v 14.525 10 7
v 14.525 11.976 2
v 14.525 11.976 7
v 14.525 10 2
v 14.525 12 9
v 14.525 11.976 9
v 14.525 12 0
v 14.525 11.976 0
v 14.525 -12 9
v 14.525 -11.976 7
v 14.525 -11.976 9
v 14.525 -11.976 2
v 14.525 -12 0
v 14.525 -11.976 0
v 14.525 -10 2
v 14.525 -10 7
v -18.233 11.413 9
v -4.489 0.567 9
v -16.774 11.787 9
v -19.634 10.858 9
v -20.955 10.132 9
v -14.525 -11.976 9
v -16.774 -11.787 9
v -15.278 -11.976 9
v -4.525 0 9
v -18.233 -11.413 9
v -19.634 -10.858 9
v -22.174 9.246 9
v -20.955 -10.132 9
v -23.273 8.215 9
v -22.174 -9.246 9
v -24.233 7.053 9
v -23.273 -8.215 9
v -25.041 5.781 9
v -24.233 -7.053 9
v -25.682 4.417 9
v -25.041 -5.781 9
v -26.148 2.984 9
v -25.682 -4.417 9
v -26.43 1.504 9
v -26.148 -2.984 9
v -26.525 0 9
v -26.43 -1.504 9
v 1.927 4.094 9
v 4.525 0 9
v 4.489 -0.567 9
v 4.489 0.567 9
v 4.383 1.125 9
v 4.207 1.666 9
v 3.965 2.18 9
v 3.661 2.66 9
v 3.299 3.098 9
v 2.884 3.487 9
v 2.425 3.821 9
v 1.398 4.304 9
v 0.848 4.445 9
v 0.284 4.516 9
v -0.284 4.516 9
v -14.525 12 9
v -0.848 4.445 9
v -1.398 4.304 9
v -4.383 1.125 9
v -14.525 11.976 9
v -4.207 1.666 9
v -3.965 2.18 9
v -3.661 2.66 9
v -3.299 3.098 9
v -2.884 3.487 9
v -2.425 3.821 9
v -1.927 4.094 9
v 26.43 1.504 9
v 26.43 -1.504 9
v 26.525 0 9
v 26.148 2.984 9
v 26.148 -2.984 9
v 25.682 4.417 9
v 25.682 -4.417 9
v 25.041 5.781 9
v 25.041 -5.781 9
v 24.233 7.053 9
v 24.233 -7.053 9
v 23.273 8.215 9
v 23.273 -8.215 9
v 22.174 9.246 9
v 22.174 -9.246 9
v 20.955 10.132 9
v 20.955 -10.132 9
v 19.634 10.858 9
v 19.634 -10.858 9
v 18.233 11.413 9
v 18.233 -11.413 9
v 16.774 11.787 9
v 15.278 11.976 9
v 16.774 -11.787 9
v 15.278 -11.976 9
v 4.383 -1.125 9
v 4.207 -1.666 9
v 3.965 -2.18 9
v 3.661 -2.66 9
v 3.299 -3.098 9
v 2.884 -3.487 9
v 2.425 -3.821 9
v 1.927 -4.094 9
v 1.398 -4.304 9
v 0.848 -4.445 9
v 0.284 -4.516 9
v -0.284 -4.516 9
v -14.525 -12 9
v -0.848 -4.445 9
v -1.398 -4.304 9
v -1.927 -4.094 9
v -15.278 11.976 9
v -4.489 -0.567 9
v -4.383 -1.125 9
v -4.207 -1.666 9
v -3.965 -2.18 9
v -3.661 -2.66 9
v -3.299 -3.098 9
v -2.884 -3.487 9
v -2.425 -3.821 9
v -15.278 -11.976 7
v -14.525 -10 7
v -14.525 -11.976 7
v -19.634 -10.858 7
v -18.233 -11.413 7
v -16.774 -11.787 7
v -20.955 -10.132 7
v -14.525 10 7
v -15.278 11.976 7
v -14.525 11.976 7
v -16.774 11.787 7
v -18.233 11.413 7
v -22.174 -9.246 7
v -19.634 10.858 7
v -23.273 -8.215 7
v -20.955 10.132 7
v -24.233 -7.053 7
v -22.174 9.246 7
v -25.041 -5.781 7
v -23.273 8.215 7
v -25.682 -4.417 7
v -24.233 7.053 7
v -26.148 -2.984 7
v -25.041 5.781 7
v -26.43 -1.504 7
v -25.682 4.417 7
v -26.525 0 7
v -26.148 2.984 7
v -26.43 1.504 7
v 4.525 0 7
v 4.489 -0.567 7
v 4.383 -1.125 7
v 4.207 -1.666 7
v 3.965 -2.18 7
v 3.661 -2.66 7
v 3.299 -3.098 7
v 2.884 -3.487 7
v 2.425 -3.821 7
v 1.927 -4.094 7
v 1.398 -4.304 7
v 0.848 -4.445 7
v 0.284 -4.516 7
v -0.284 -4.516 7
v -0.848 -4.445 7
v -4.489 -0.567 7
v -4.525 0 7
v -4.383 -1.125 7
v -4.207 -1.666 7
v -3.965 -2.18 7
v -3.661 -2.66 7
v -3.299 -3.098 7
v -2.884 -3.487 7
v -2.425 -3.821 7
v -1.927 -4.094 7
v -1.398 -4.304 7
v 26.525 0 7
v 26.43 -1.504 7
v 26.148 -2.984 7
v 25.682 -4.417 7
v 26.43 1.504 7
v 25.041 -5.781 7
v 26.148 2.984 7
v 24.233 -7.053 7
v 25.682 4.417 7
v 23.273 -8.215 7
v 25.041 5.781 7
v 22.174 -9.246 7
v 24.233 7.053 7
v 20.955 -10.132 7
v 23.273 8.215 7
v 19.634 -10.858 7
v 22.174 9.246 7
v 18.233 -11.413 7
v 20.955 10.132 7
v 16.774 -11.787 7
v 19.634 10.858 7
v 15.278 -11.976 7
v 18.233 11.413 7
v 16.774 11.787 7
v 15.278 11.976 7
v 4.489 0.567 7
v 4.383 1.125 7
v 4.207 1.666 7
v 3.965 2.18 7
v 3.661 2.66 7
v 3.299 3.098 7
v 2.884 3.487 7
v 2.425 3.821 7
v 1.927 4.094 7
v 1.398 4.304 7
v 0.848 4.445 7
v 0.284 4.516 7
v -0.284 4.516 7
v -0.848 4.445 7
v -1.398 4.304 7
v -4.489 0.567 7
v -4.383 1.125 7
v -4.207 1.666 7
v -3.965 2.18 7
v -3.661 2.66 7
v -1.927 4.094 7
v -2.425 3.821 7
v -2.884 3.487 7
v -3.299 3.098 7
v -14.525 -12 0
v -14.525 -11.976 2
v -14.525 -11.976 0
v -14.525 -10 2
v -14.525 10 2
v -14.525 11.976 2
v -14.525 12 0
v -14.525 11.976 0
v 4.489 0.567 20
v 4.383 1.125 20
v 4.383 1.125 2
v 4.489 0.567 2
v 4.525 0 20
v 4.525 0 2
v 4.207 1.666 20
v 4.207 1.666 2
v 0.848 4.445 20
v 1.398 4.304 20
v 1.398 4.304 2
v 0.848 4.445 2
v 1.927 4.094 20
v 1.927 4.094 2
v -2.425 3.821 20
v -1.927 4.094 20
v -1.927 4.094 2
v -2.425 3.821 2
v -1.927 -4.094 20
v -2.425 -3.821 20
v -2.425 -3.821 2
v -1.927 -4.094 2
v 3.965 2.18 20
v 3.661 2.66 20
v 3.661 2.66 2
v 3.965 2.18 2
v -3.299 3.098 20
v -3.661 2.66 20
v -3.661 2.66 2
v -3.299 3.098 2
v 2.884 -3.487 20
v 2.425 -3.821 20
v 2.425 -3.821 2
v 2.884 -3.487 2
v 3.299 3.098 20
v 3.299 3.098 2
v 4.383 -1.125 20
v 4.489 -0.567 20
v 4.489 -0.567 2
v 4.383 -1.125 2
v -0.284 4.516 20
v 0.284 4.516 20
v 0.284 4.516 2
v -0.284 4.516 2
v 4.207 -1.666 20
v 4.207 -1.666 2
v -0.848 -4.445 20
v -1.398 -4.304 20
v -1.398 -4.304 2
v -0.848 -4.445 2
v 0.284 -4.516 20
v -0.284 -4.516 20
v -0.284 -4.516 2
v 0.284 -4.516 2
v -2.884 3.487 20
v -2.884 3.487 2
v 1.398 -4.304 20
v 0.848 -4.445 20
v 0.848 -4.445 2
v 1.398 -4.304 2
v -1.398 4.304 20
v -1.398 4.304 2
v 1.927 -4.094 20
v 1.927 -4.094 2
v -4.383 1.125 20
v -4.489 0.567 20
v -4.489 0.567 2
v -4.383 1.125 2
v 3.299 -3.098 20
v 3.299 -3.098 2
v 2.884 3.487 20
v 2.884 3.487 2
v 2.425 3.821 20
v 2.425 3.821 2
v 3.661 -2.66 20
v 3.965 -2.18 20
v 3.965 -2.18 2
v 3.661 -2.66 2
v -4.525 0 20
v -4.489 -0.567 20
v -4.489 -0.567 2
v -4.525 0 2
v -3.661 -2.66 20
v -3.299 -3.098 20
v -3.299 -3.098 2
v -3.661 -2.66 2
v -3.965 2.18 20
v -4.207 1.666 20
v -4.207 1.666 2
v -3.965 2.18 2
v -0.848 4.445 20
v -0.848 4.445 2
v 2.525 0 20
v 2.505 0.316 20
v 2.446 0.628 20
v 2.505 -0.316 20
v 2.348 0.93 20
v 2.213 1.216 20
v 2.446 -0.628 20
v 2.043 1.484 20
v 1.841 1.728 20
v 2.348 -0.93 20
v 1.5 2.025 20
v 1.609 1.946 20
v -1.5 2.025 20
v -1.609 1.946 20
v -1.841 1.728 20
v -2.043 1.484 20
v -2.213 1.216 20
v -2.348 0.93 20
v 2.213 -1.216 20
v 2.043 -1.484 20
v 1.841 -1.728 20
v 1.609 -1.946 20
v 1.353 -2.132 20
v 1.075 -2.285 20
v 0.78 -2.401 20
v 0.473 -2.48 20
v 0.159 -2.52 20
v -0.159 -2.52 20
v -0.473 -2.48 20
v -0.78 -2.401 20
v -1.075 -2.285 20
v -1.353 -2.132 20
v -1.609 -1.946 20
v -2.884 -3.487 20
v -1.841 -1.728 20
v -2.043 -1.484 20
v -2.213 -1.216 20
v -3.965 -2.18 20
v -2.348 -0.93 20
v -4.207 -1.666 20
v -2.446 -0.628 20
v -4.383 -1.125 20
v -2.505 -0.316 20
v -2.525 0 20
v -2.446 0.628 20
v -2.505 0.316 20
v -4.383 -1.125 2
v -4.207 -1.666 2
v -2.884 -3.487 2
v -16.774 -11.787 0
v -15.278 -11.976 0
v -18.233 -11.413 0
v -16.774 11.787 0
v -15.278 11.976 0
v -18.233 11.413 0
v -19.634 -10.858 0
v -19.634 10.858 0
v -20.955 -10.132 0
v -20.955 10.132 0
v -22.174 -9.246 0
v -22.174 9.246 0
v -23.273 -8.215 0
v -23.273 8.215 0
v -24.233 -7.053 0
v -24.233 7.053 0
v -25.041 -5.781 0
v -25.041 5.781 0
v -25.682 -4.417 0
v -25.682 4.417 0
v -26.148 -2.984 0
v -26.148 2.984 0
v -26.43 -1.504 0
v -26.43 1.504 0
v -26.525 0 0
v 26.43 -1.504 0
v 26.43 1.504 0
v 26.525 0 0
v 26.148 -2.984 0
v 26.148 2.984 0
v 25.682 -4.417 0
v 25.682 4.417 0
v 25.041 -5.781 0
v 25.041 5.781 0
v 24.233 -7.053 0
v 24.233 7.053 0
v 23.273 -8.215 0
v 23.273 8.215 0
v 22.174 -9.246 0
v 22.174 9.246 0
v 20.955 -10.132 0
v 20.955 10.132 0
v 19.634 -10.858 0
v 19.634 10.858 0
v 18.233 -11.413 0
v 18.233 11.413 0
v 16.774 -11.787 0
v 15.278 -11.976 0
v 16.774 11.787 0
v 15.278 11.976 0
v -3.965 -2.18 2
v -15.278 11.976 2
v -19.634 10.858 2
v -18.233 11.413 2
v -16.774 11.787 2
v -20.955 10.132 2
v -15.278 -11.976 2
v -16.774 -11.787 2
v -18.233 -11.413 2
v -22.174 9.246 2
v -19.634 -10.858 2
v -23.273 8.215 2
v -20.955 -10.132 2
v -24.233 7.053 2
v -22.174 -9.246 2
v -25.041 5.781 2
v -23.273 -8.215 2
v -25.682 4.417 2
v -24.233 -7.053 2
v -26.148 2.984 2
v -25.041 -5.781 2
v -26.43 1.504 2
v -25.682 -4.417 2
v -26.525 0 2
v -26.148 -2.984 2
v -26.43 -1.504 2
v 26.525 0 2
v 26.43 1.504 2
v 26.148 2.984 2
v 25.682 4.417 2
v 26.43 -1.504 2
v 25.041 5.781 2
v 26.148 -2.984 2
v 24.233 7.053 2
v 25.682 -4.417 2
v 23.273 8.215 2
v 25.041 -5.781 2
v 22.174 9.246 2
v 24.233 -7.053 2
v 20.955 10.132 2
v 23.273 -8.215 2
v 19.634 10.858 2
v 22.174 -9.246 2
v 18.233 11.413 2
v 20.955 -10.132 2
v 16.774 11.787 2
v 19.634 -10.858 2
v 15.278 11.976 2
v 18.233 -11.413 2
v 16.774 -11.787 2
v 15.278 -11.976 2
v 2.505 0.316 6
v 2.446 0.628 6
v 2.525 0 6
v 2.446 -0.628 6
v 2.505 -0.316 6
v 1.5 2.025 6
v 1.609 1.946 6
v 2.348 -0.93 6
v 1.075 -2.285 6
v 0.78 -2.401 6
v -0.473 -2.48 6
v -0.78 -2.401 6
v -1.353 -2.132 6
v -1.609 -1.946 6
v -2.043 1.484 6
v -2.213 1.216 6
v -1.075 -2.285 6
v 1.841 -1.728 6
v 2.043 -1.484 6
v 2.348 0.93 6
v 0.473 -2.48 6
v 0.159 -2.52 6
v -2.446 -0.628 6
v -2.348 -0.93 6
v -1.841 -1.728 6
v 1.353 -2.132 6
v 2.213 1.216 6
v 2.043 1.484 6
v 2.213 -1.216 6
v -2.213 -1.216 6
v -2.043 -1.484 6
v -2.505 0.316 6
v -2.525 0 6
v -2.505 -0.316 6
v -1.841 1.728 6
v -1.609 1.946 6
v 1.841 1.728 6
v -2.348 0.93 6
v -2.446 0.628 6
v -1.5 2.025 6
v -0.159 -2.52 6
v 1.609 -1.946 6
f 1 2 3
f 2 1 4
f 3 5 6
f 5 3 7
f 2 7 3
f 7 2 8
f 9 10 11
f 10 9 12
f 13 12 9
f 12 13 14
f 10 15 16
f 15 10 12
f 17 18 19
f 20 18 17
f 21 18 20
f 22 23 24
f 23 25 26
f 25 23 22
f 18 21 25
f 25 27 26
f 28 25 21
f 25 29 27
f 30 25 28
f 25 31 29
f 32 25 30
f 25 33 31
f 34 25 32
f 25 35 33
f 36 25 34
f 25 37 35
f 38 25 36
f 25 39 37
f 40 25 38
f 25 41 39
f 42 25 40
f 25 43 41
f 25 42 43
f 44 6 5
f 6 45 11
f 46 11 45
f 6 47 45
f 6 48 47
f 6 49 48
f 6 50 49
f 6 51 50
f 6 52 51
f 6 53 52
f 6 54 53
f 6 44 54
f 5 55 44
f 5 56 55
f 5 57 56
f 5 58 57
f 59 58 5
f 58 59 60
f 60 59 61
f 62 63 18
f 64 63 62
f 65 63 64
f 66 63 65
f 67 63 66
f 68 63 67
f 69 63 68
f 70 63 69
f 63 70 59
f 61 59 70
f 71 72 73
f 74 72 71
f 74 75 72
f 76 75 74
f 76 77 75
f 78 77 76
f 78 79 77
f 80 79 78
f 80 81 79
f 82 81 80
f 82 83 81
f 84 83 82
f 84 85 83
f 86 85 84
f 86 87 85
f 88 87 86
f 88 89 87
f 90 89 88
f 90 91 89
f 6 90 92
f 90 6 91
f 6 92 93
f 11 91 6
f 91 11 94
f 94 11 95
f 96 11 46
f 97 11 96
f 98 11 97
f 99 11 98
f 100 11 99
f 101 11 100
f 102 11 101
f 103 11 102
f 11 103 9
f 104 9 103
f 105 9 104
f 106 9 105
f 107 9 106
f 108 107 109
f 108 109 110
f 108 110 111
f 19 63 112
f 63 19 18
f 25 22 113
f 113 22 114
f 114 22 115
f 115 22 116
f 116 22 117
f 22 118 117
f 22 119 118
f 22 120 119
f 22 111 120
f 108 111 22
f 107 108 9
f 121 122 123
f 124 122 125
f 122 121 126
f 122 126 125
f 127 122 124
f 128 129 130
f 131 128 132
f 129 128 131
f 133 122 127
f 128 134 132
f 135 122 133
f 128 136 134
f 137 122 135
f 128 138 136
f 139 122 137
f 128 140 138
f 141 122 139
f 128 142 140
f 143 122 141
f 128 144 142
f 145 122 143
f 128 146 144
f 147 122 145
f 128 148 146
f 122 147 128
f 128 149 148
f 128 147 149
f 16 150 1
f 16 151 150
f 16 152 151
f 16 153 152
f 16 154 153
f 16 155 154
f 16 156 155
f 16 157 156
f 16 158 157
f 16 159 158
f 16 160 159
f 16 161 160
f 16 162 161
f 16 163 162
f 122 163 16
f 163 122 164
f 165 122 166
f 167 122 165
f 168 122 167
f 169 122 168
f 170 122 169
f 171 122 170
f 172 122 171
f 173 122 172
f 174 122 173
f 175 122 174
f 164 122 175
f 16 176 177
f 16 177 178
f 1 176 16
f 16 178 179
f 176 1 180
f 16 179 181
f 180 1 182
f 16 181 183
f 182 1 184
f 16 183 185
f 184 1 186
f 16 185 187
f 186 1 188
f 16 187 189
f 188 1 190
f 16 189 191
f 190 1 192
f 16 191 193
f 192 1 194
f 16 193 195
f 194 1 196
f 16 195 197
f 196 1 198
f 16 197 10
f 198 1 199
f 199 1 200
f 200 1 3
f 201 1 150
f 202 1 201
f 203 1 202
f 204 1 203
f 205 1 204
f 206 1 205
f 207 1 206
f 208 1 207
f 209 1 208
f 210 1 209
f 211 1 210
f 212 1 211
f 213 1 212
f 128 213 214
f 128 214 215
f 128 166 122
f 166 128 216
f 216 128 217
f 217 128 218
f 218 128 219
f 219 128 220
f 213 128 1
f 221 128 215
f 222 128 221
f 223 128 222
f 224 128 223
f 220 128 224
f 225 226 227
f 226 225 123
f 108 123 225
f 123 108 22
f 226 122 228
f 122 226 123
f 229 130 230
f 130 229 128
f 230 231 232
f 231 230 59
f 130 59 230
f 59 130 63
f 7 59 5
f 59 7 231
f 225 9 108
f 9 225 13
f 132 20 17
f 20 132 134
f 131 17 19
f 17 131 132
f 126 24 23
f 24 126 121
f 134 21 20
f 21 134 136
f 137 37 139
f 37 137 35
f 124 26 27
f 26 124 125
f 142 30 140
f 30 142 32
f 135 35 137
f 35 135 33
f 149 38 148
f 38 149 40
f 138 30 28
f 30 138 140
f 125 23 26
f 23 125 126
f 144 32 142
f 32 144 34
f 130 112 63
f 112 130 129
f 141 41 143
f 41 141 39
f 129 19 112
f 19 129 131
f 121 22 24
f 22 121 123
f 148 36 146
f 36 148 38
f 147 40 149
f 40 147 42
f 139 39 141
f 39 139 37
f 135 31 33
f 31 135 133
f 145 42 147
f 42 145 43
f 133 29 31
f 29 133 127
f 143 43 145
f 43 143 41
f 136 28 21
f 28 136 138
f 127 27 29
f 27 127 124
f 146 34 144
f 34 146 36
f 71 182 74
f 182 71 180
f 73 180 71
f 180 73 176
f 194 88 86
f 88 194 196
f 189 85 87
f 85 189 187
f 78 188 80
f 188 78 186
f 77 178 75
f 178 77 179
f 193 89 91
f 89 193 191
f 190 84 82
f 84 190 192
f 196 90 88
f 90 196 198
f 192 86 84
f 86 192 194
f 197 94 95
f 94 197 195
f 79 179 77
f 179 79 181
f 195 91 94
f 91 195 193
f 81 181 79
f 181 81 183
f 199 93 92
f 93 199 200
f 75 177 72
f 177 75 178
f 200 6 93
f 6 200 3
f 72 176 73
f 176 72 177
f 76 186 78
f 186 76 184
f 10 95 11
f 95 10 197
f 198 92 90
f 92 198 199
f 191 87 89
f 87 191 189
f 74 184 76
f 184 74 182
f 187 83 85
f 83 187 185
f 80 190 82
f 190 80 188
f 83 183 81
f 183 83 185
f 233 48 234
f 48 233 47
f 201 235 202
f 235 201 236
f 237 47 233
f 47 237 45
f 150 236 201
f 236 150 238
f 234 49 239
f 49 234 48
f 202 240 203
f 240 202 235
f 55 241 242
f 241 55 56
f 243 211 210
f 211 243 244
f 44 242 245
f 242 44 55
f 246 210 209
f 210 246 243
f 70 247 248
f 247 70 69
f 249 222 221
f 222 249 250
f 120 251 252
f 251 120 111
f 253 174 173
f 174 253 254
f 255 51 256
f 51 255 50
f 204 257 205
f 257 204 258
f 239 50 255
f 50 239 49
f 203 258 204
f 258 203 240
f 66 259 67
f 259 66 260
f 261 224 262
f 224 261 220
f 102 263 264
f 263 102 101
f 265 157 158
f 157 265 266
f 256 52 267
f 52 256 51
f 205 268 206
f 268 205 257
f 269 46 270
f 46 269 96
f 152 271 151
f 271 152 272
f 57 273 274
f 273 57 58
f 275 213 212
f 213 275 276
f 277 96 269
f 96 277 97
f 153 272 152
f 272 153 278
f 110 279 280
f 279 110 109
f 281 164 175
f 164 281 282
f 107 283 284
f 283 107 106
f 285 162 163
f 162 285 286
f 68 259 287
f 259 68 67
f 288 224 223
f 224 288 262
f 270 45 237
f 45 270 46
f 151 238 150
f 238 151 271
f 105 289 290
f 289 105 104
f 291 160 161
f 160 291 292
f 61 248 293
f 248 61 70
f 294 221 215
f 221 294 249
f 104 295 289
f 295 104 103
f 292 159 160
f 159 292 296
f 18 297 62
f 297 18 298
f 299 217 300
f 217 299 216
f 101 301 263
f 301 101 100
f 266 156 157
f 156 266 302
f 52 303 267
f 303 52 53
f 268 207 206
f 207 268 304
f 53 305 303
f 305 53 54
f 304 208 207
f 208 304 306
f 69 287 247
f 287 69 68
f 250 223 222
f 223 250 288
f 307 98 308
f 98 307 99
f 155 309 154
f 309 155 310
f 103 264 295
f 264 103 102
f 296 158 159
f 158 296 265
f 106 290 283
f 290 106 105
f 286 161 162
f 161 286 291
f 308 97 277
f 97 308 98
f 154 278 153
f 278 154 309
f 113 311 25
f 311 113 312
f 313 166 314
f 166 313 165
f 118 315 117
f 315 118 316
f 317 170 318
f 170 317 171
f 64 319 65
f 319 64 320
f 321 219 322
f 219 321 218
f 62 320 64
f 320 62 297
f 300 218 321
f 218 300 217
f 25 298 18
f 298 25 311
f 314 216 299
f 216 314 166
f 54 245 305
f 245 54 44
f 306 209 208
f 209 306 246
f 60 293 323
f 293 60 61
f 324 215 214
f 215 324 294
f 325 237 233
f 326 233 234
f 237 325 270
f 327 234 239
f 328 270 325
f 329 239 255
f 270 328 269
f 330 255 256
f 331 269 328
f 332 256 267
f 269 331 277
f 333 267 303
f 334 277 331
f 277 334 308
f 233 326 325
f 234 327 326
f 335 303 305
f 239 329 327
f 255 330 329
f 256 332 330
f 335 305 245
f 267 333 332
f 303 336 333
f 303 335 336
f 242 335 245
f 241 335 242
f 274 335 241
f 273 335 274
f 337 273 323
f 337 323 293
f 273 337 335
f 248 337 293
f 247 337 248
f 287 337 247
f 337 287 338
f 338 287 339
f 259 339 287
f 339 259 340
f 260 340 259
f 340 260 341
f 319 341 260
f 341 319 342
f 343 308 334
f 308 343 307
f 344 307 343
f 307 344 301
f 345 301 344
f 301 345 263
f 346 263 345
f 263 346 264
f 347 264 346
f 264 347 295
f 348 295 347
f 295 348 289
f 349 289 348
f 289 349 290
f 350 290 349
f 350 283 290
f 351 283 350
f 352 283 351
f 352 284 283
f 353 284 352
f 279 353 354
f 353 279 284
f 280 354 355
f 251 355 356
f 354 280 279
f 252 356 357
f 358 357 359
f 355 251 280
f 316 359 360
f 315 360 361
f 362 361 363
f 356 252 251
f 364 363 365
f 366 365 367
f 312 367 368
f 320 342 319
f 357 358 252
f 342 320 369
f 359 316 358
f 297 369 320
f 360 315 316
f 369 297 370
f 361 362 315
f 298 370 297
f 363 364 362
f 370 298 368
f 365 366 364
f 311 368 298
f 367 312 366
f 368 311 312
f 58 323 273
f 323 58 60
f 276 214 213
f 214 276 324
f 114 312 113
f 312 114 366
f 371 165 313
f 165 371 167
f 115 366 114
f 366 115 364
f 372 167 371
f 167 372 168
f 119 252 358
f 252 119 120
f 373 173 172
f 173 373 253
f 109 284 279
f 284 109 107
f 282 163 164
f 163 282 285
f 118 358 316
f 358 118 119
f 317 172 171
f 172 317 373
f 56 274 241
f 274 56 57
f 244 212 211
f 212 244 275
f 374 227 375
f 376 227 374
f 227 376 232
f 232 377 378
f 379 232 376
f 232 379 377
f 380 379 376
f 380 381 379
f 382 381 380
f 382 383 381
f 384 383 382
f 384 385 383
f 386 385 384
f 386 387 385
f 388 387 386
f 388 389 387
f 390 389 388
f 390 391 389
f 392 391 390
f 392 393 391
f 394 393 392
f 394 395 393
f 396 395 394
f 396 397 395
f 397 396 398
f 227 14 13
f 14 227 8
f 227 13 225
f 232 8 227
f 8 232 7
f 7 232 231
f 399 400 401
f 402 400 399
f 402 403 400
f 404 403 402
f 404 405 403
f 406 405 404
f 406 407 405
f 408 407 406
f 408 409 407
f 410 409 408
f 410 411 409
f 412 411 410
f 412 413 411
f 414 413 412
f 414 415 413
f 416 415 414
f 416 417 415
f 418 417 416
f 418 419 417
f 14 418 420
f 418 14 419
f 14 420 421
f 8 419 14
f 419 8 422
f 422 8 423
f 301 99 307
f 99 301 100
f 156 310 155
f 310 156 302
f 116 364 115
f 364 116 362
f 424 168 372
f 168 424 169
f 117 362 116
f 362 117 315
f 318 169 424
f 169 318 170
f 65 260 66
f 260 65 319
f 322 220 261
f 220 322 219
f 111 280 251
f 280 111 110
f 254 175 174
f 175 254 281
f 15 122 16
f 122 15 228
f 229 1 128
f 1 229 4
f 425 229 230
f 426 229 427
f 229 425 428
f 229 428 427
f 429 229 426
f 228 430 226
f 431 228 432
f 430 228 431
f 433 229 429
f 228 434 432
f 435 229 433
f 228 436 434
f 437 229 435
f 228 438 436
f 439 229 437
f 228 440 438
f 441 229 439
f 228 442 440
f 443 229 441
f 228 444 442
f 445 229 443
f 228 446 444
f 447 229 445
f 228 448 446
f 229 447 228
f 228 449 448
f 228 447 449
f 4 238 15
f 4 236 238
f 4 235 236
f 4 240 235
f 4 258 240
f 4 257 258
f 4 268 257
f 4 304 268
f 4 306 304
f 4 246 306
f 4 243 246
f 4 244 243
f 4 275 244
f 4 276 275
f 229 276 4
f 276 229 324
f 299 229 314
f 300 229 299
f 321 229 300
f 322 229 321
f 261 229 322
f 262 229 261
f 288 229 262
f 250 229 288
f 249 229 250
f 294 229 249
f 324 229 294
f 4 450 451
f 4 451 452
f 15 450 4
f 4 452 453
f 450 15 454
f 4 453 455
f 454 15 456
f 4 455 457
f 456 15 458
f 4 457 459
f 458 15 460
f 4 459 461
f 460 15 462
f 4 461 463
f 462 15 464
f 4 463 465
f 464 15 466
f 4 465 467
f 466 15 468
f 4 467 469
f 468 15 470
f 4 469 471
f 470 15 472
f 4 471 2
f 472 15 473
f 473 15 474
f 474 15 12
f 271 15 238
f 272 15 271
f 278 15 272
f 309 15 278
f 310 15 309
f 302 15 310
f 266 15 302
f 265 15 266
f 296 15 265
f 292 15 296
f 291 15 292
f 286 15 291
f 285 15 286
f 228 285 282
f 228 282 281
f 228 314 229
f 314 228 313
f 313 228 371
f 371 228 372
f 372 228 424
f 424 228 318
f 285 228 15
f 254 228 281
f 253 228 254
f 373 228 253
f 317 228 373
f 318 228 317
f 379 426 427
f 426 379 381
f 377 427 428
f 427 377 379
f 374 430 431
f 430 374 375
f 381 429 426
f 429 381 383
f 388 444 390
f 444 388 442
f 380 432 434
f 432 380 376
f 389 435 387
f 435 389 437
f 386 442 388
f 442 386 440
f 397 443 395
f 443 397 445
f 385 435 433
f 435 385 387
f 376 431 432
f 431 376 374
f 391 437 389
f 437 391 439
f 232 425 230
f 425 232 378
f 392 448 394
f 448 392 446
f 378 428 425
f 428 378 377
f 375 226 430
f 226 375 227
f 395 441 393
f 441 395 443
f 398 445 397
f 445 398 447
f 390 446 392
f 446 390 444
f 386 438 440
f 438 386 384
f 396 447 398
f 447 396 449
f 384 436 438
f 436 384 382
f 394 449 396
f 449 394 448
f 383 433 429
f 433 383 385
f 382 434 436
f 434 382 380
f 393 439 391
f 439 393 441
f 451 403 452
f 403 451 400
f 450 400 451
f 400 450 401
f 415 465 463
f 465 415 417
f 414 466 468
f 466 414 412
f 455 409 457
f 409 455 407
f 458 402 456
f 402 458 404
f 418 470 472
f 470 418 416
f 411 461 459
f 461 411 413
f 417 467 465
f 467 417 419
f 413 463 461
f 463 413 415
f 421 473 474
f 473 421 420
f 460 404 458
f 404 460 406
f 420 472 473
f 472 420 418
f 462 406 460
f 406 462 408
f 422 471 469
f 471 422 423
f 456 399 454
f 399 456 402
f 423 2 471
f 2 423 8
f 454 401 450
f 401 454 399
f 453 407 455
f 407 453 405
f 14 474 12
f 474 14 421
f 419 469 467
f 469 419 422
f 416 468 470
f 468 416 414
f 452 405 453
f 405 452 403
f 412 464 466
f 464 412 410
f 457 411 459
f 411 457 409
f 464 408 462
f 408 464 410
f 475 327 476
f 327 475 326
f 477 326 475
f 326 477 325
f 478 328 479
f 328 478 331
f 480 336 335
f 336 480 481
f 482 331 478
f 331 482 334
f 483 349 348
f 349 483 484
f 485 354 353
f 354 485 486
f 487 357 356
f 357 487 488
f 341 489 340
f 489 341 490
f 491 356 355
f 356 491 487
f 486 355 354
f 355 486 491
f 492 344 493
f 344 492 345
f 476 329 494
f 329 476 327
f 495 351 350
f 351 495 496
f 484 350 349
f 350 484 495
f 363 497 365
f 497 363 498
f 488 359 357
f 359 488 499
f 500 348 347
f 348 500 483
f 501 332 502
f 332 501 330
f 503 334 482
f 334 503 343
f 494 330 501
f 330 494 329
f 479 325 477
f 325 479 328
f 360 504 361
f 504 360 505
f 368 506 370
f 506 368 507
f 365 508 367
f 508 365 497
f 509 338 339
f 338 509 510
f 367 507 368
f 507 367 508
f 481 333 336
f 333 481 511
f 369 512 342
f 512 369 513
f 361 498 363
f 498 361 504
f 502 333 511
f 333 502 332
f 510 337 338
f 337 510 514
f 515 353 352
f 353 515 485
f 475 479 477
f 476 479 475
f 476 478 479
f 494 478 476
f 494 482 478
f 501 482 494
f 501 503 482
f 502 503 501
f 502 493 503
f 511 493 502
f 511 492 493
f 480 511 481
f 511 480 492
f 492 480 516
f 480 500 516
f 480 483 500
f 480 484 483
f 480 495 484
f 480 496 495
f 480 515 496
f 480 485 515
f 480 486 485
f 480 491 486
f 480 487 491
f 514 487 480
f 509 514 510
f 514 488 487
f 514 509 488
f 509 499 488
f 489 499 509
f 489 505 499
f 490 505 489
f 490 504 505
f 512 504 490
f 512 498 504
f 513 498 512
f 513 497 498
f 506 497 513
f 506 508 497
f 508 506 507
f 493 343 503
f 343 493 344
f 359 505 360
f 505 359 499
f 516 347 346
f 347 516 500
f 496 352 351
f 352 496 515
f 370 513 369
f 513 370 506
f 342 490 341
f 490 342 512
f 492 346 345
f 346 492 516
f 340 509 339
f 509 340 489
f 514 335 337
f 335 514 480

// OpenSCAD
$fn=50;

magnetDiameter=20;
magnetThickness=5;

thickness=2;

axisDiameter=5.05;
cutSize=0.5;

extraHeight=6;
totalHeight=20;

difference() {
    union() {
        // axis of the stepper
        cylinder(h = totalHeight, d=axisDiameter+2*thickness);


        // walls
        translate([-magnetDiameter/2-axisDiameter/2-thickness,-magnetDiameter/2-thickness,0]) {
            cube([magnetDiameter+axisDiameter+2*thickness,thickness,2*thickness+magnetThickness]);
        }
        translate([-magnetDiameter/2-axisDiameter/2-thickness,+magnetDiameter/2,0]) {
            cube([magnetDiameter+axisDiameter+2*thickness,thickness,2*thickness+magnetThickness]);
        }

        // top layer
        translate([0,0,thickness+magnetThickness]) {
            translate([-magnetDiameter/2-axisDiameter/2-thickness,-magnetDiameter/2-thickness,0]) {
                cube([magnetDiameter+axisDiameter+2*thickness,magnetDiameter+2*thickness,thickness]);
            }
            translate([-(thickness+axisDiameter/2+magnetDiameter/2),0,0]) {
                cylinder(h = thickness, d=magnetDiameter+2*thickness);
            }
            translate([+(thickness+axisDiameter/2+magnetDiameter/2),0,0]) {
                cylinder(h = thickness, d=magnetDiameter+2*thickness);
            } 
        }
        // bottom layer
        translate([-magnetDiameter/2-axisDiameter/2-thickness,-magnetDiameter/2-thickness,0]) {
            cube([magnetDiameter+axisDiameter+2*thickness,magnetDiameter+2*thickness,thickness]);
        }
        translate([-(thickness+axisDiameter/2+magnetDiameter/2),0,0]) {
            cylinder(h = thickness, d=magnetDiameter+2*thickness);
        }
        translate([+(thickness+axisDiameter/2+magnetDiameter/2),0,0]) {
            cylinder(h = thickness, d=magnetDiameter+2*thickness);
        } 
    };
    translate([0,0,extraHeight]) {
        difference() {
            cylinder(h = totalHeight, d=axisDiameter);
            translate([-axisDiameter/2,axisDiameter/2-cutSize,0]) {
                cube([axisDiameter, axisDiameter, totalHeight]);
            }
        }
    }
}
